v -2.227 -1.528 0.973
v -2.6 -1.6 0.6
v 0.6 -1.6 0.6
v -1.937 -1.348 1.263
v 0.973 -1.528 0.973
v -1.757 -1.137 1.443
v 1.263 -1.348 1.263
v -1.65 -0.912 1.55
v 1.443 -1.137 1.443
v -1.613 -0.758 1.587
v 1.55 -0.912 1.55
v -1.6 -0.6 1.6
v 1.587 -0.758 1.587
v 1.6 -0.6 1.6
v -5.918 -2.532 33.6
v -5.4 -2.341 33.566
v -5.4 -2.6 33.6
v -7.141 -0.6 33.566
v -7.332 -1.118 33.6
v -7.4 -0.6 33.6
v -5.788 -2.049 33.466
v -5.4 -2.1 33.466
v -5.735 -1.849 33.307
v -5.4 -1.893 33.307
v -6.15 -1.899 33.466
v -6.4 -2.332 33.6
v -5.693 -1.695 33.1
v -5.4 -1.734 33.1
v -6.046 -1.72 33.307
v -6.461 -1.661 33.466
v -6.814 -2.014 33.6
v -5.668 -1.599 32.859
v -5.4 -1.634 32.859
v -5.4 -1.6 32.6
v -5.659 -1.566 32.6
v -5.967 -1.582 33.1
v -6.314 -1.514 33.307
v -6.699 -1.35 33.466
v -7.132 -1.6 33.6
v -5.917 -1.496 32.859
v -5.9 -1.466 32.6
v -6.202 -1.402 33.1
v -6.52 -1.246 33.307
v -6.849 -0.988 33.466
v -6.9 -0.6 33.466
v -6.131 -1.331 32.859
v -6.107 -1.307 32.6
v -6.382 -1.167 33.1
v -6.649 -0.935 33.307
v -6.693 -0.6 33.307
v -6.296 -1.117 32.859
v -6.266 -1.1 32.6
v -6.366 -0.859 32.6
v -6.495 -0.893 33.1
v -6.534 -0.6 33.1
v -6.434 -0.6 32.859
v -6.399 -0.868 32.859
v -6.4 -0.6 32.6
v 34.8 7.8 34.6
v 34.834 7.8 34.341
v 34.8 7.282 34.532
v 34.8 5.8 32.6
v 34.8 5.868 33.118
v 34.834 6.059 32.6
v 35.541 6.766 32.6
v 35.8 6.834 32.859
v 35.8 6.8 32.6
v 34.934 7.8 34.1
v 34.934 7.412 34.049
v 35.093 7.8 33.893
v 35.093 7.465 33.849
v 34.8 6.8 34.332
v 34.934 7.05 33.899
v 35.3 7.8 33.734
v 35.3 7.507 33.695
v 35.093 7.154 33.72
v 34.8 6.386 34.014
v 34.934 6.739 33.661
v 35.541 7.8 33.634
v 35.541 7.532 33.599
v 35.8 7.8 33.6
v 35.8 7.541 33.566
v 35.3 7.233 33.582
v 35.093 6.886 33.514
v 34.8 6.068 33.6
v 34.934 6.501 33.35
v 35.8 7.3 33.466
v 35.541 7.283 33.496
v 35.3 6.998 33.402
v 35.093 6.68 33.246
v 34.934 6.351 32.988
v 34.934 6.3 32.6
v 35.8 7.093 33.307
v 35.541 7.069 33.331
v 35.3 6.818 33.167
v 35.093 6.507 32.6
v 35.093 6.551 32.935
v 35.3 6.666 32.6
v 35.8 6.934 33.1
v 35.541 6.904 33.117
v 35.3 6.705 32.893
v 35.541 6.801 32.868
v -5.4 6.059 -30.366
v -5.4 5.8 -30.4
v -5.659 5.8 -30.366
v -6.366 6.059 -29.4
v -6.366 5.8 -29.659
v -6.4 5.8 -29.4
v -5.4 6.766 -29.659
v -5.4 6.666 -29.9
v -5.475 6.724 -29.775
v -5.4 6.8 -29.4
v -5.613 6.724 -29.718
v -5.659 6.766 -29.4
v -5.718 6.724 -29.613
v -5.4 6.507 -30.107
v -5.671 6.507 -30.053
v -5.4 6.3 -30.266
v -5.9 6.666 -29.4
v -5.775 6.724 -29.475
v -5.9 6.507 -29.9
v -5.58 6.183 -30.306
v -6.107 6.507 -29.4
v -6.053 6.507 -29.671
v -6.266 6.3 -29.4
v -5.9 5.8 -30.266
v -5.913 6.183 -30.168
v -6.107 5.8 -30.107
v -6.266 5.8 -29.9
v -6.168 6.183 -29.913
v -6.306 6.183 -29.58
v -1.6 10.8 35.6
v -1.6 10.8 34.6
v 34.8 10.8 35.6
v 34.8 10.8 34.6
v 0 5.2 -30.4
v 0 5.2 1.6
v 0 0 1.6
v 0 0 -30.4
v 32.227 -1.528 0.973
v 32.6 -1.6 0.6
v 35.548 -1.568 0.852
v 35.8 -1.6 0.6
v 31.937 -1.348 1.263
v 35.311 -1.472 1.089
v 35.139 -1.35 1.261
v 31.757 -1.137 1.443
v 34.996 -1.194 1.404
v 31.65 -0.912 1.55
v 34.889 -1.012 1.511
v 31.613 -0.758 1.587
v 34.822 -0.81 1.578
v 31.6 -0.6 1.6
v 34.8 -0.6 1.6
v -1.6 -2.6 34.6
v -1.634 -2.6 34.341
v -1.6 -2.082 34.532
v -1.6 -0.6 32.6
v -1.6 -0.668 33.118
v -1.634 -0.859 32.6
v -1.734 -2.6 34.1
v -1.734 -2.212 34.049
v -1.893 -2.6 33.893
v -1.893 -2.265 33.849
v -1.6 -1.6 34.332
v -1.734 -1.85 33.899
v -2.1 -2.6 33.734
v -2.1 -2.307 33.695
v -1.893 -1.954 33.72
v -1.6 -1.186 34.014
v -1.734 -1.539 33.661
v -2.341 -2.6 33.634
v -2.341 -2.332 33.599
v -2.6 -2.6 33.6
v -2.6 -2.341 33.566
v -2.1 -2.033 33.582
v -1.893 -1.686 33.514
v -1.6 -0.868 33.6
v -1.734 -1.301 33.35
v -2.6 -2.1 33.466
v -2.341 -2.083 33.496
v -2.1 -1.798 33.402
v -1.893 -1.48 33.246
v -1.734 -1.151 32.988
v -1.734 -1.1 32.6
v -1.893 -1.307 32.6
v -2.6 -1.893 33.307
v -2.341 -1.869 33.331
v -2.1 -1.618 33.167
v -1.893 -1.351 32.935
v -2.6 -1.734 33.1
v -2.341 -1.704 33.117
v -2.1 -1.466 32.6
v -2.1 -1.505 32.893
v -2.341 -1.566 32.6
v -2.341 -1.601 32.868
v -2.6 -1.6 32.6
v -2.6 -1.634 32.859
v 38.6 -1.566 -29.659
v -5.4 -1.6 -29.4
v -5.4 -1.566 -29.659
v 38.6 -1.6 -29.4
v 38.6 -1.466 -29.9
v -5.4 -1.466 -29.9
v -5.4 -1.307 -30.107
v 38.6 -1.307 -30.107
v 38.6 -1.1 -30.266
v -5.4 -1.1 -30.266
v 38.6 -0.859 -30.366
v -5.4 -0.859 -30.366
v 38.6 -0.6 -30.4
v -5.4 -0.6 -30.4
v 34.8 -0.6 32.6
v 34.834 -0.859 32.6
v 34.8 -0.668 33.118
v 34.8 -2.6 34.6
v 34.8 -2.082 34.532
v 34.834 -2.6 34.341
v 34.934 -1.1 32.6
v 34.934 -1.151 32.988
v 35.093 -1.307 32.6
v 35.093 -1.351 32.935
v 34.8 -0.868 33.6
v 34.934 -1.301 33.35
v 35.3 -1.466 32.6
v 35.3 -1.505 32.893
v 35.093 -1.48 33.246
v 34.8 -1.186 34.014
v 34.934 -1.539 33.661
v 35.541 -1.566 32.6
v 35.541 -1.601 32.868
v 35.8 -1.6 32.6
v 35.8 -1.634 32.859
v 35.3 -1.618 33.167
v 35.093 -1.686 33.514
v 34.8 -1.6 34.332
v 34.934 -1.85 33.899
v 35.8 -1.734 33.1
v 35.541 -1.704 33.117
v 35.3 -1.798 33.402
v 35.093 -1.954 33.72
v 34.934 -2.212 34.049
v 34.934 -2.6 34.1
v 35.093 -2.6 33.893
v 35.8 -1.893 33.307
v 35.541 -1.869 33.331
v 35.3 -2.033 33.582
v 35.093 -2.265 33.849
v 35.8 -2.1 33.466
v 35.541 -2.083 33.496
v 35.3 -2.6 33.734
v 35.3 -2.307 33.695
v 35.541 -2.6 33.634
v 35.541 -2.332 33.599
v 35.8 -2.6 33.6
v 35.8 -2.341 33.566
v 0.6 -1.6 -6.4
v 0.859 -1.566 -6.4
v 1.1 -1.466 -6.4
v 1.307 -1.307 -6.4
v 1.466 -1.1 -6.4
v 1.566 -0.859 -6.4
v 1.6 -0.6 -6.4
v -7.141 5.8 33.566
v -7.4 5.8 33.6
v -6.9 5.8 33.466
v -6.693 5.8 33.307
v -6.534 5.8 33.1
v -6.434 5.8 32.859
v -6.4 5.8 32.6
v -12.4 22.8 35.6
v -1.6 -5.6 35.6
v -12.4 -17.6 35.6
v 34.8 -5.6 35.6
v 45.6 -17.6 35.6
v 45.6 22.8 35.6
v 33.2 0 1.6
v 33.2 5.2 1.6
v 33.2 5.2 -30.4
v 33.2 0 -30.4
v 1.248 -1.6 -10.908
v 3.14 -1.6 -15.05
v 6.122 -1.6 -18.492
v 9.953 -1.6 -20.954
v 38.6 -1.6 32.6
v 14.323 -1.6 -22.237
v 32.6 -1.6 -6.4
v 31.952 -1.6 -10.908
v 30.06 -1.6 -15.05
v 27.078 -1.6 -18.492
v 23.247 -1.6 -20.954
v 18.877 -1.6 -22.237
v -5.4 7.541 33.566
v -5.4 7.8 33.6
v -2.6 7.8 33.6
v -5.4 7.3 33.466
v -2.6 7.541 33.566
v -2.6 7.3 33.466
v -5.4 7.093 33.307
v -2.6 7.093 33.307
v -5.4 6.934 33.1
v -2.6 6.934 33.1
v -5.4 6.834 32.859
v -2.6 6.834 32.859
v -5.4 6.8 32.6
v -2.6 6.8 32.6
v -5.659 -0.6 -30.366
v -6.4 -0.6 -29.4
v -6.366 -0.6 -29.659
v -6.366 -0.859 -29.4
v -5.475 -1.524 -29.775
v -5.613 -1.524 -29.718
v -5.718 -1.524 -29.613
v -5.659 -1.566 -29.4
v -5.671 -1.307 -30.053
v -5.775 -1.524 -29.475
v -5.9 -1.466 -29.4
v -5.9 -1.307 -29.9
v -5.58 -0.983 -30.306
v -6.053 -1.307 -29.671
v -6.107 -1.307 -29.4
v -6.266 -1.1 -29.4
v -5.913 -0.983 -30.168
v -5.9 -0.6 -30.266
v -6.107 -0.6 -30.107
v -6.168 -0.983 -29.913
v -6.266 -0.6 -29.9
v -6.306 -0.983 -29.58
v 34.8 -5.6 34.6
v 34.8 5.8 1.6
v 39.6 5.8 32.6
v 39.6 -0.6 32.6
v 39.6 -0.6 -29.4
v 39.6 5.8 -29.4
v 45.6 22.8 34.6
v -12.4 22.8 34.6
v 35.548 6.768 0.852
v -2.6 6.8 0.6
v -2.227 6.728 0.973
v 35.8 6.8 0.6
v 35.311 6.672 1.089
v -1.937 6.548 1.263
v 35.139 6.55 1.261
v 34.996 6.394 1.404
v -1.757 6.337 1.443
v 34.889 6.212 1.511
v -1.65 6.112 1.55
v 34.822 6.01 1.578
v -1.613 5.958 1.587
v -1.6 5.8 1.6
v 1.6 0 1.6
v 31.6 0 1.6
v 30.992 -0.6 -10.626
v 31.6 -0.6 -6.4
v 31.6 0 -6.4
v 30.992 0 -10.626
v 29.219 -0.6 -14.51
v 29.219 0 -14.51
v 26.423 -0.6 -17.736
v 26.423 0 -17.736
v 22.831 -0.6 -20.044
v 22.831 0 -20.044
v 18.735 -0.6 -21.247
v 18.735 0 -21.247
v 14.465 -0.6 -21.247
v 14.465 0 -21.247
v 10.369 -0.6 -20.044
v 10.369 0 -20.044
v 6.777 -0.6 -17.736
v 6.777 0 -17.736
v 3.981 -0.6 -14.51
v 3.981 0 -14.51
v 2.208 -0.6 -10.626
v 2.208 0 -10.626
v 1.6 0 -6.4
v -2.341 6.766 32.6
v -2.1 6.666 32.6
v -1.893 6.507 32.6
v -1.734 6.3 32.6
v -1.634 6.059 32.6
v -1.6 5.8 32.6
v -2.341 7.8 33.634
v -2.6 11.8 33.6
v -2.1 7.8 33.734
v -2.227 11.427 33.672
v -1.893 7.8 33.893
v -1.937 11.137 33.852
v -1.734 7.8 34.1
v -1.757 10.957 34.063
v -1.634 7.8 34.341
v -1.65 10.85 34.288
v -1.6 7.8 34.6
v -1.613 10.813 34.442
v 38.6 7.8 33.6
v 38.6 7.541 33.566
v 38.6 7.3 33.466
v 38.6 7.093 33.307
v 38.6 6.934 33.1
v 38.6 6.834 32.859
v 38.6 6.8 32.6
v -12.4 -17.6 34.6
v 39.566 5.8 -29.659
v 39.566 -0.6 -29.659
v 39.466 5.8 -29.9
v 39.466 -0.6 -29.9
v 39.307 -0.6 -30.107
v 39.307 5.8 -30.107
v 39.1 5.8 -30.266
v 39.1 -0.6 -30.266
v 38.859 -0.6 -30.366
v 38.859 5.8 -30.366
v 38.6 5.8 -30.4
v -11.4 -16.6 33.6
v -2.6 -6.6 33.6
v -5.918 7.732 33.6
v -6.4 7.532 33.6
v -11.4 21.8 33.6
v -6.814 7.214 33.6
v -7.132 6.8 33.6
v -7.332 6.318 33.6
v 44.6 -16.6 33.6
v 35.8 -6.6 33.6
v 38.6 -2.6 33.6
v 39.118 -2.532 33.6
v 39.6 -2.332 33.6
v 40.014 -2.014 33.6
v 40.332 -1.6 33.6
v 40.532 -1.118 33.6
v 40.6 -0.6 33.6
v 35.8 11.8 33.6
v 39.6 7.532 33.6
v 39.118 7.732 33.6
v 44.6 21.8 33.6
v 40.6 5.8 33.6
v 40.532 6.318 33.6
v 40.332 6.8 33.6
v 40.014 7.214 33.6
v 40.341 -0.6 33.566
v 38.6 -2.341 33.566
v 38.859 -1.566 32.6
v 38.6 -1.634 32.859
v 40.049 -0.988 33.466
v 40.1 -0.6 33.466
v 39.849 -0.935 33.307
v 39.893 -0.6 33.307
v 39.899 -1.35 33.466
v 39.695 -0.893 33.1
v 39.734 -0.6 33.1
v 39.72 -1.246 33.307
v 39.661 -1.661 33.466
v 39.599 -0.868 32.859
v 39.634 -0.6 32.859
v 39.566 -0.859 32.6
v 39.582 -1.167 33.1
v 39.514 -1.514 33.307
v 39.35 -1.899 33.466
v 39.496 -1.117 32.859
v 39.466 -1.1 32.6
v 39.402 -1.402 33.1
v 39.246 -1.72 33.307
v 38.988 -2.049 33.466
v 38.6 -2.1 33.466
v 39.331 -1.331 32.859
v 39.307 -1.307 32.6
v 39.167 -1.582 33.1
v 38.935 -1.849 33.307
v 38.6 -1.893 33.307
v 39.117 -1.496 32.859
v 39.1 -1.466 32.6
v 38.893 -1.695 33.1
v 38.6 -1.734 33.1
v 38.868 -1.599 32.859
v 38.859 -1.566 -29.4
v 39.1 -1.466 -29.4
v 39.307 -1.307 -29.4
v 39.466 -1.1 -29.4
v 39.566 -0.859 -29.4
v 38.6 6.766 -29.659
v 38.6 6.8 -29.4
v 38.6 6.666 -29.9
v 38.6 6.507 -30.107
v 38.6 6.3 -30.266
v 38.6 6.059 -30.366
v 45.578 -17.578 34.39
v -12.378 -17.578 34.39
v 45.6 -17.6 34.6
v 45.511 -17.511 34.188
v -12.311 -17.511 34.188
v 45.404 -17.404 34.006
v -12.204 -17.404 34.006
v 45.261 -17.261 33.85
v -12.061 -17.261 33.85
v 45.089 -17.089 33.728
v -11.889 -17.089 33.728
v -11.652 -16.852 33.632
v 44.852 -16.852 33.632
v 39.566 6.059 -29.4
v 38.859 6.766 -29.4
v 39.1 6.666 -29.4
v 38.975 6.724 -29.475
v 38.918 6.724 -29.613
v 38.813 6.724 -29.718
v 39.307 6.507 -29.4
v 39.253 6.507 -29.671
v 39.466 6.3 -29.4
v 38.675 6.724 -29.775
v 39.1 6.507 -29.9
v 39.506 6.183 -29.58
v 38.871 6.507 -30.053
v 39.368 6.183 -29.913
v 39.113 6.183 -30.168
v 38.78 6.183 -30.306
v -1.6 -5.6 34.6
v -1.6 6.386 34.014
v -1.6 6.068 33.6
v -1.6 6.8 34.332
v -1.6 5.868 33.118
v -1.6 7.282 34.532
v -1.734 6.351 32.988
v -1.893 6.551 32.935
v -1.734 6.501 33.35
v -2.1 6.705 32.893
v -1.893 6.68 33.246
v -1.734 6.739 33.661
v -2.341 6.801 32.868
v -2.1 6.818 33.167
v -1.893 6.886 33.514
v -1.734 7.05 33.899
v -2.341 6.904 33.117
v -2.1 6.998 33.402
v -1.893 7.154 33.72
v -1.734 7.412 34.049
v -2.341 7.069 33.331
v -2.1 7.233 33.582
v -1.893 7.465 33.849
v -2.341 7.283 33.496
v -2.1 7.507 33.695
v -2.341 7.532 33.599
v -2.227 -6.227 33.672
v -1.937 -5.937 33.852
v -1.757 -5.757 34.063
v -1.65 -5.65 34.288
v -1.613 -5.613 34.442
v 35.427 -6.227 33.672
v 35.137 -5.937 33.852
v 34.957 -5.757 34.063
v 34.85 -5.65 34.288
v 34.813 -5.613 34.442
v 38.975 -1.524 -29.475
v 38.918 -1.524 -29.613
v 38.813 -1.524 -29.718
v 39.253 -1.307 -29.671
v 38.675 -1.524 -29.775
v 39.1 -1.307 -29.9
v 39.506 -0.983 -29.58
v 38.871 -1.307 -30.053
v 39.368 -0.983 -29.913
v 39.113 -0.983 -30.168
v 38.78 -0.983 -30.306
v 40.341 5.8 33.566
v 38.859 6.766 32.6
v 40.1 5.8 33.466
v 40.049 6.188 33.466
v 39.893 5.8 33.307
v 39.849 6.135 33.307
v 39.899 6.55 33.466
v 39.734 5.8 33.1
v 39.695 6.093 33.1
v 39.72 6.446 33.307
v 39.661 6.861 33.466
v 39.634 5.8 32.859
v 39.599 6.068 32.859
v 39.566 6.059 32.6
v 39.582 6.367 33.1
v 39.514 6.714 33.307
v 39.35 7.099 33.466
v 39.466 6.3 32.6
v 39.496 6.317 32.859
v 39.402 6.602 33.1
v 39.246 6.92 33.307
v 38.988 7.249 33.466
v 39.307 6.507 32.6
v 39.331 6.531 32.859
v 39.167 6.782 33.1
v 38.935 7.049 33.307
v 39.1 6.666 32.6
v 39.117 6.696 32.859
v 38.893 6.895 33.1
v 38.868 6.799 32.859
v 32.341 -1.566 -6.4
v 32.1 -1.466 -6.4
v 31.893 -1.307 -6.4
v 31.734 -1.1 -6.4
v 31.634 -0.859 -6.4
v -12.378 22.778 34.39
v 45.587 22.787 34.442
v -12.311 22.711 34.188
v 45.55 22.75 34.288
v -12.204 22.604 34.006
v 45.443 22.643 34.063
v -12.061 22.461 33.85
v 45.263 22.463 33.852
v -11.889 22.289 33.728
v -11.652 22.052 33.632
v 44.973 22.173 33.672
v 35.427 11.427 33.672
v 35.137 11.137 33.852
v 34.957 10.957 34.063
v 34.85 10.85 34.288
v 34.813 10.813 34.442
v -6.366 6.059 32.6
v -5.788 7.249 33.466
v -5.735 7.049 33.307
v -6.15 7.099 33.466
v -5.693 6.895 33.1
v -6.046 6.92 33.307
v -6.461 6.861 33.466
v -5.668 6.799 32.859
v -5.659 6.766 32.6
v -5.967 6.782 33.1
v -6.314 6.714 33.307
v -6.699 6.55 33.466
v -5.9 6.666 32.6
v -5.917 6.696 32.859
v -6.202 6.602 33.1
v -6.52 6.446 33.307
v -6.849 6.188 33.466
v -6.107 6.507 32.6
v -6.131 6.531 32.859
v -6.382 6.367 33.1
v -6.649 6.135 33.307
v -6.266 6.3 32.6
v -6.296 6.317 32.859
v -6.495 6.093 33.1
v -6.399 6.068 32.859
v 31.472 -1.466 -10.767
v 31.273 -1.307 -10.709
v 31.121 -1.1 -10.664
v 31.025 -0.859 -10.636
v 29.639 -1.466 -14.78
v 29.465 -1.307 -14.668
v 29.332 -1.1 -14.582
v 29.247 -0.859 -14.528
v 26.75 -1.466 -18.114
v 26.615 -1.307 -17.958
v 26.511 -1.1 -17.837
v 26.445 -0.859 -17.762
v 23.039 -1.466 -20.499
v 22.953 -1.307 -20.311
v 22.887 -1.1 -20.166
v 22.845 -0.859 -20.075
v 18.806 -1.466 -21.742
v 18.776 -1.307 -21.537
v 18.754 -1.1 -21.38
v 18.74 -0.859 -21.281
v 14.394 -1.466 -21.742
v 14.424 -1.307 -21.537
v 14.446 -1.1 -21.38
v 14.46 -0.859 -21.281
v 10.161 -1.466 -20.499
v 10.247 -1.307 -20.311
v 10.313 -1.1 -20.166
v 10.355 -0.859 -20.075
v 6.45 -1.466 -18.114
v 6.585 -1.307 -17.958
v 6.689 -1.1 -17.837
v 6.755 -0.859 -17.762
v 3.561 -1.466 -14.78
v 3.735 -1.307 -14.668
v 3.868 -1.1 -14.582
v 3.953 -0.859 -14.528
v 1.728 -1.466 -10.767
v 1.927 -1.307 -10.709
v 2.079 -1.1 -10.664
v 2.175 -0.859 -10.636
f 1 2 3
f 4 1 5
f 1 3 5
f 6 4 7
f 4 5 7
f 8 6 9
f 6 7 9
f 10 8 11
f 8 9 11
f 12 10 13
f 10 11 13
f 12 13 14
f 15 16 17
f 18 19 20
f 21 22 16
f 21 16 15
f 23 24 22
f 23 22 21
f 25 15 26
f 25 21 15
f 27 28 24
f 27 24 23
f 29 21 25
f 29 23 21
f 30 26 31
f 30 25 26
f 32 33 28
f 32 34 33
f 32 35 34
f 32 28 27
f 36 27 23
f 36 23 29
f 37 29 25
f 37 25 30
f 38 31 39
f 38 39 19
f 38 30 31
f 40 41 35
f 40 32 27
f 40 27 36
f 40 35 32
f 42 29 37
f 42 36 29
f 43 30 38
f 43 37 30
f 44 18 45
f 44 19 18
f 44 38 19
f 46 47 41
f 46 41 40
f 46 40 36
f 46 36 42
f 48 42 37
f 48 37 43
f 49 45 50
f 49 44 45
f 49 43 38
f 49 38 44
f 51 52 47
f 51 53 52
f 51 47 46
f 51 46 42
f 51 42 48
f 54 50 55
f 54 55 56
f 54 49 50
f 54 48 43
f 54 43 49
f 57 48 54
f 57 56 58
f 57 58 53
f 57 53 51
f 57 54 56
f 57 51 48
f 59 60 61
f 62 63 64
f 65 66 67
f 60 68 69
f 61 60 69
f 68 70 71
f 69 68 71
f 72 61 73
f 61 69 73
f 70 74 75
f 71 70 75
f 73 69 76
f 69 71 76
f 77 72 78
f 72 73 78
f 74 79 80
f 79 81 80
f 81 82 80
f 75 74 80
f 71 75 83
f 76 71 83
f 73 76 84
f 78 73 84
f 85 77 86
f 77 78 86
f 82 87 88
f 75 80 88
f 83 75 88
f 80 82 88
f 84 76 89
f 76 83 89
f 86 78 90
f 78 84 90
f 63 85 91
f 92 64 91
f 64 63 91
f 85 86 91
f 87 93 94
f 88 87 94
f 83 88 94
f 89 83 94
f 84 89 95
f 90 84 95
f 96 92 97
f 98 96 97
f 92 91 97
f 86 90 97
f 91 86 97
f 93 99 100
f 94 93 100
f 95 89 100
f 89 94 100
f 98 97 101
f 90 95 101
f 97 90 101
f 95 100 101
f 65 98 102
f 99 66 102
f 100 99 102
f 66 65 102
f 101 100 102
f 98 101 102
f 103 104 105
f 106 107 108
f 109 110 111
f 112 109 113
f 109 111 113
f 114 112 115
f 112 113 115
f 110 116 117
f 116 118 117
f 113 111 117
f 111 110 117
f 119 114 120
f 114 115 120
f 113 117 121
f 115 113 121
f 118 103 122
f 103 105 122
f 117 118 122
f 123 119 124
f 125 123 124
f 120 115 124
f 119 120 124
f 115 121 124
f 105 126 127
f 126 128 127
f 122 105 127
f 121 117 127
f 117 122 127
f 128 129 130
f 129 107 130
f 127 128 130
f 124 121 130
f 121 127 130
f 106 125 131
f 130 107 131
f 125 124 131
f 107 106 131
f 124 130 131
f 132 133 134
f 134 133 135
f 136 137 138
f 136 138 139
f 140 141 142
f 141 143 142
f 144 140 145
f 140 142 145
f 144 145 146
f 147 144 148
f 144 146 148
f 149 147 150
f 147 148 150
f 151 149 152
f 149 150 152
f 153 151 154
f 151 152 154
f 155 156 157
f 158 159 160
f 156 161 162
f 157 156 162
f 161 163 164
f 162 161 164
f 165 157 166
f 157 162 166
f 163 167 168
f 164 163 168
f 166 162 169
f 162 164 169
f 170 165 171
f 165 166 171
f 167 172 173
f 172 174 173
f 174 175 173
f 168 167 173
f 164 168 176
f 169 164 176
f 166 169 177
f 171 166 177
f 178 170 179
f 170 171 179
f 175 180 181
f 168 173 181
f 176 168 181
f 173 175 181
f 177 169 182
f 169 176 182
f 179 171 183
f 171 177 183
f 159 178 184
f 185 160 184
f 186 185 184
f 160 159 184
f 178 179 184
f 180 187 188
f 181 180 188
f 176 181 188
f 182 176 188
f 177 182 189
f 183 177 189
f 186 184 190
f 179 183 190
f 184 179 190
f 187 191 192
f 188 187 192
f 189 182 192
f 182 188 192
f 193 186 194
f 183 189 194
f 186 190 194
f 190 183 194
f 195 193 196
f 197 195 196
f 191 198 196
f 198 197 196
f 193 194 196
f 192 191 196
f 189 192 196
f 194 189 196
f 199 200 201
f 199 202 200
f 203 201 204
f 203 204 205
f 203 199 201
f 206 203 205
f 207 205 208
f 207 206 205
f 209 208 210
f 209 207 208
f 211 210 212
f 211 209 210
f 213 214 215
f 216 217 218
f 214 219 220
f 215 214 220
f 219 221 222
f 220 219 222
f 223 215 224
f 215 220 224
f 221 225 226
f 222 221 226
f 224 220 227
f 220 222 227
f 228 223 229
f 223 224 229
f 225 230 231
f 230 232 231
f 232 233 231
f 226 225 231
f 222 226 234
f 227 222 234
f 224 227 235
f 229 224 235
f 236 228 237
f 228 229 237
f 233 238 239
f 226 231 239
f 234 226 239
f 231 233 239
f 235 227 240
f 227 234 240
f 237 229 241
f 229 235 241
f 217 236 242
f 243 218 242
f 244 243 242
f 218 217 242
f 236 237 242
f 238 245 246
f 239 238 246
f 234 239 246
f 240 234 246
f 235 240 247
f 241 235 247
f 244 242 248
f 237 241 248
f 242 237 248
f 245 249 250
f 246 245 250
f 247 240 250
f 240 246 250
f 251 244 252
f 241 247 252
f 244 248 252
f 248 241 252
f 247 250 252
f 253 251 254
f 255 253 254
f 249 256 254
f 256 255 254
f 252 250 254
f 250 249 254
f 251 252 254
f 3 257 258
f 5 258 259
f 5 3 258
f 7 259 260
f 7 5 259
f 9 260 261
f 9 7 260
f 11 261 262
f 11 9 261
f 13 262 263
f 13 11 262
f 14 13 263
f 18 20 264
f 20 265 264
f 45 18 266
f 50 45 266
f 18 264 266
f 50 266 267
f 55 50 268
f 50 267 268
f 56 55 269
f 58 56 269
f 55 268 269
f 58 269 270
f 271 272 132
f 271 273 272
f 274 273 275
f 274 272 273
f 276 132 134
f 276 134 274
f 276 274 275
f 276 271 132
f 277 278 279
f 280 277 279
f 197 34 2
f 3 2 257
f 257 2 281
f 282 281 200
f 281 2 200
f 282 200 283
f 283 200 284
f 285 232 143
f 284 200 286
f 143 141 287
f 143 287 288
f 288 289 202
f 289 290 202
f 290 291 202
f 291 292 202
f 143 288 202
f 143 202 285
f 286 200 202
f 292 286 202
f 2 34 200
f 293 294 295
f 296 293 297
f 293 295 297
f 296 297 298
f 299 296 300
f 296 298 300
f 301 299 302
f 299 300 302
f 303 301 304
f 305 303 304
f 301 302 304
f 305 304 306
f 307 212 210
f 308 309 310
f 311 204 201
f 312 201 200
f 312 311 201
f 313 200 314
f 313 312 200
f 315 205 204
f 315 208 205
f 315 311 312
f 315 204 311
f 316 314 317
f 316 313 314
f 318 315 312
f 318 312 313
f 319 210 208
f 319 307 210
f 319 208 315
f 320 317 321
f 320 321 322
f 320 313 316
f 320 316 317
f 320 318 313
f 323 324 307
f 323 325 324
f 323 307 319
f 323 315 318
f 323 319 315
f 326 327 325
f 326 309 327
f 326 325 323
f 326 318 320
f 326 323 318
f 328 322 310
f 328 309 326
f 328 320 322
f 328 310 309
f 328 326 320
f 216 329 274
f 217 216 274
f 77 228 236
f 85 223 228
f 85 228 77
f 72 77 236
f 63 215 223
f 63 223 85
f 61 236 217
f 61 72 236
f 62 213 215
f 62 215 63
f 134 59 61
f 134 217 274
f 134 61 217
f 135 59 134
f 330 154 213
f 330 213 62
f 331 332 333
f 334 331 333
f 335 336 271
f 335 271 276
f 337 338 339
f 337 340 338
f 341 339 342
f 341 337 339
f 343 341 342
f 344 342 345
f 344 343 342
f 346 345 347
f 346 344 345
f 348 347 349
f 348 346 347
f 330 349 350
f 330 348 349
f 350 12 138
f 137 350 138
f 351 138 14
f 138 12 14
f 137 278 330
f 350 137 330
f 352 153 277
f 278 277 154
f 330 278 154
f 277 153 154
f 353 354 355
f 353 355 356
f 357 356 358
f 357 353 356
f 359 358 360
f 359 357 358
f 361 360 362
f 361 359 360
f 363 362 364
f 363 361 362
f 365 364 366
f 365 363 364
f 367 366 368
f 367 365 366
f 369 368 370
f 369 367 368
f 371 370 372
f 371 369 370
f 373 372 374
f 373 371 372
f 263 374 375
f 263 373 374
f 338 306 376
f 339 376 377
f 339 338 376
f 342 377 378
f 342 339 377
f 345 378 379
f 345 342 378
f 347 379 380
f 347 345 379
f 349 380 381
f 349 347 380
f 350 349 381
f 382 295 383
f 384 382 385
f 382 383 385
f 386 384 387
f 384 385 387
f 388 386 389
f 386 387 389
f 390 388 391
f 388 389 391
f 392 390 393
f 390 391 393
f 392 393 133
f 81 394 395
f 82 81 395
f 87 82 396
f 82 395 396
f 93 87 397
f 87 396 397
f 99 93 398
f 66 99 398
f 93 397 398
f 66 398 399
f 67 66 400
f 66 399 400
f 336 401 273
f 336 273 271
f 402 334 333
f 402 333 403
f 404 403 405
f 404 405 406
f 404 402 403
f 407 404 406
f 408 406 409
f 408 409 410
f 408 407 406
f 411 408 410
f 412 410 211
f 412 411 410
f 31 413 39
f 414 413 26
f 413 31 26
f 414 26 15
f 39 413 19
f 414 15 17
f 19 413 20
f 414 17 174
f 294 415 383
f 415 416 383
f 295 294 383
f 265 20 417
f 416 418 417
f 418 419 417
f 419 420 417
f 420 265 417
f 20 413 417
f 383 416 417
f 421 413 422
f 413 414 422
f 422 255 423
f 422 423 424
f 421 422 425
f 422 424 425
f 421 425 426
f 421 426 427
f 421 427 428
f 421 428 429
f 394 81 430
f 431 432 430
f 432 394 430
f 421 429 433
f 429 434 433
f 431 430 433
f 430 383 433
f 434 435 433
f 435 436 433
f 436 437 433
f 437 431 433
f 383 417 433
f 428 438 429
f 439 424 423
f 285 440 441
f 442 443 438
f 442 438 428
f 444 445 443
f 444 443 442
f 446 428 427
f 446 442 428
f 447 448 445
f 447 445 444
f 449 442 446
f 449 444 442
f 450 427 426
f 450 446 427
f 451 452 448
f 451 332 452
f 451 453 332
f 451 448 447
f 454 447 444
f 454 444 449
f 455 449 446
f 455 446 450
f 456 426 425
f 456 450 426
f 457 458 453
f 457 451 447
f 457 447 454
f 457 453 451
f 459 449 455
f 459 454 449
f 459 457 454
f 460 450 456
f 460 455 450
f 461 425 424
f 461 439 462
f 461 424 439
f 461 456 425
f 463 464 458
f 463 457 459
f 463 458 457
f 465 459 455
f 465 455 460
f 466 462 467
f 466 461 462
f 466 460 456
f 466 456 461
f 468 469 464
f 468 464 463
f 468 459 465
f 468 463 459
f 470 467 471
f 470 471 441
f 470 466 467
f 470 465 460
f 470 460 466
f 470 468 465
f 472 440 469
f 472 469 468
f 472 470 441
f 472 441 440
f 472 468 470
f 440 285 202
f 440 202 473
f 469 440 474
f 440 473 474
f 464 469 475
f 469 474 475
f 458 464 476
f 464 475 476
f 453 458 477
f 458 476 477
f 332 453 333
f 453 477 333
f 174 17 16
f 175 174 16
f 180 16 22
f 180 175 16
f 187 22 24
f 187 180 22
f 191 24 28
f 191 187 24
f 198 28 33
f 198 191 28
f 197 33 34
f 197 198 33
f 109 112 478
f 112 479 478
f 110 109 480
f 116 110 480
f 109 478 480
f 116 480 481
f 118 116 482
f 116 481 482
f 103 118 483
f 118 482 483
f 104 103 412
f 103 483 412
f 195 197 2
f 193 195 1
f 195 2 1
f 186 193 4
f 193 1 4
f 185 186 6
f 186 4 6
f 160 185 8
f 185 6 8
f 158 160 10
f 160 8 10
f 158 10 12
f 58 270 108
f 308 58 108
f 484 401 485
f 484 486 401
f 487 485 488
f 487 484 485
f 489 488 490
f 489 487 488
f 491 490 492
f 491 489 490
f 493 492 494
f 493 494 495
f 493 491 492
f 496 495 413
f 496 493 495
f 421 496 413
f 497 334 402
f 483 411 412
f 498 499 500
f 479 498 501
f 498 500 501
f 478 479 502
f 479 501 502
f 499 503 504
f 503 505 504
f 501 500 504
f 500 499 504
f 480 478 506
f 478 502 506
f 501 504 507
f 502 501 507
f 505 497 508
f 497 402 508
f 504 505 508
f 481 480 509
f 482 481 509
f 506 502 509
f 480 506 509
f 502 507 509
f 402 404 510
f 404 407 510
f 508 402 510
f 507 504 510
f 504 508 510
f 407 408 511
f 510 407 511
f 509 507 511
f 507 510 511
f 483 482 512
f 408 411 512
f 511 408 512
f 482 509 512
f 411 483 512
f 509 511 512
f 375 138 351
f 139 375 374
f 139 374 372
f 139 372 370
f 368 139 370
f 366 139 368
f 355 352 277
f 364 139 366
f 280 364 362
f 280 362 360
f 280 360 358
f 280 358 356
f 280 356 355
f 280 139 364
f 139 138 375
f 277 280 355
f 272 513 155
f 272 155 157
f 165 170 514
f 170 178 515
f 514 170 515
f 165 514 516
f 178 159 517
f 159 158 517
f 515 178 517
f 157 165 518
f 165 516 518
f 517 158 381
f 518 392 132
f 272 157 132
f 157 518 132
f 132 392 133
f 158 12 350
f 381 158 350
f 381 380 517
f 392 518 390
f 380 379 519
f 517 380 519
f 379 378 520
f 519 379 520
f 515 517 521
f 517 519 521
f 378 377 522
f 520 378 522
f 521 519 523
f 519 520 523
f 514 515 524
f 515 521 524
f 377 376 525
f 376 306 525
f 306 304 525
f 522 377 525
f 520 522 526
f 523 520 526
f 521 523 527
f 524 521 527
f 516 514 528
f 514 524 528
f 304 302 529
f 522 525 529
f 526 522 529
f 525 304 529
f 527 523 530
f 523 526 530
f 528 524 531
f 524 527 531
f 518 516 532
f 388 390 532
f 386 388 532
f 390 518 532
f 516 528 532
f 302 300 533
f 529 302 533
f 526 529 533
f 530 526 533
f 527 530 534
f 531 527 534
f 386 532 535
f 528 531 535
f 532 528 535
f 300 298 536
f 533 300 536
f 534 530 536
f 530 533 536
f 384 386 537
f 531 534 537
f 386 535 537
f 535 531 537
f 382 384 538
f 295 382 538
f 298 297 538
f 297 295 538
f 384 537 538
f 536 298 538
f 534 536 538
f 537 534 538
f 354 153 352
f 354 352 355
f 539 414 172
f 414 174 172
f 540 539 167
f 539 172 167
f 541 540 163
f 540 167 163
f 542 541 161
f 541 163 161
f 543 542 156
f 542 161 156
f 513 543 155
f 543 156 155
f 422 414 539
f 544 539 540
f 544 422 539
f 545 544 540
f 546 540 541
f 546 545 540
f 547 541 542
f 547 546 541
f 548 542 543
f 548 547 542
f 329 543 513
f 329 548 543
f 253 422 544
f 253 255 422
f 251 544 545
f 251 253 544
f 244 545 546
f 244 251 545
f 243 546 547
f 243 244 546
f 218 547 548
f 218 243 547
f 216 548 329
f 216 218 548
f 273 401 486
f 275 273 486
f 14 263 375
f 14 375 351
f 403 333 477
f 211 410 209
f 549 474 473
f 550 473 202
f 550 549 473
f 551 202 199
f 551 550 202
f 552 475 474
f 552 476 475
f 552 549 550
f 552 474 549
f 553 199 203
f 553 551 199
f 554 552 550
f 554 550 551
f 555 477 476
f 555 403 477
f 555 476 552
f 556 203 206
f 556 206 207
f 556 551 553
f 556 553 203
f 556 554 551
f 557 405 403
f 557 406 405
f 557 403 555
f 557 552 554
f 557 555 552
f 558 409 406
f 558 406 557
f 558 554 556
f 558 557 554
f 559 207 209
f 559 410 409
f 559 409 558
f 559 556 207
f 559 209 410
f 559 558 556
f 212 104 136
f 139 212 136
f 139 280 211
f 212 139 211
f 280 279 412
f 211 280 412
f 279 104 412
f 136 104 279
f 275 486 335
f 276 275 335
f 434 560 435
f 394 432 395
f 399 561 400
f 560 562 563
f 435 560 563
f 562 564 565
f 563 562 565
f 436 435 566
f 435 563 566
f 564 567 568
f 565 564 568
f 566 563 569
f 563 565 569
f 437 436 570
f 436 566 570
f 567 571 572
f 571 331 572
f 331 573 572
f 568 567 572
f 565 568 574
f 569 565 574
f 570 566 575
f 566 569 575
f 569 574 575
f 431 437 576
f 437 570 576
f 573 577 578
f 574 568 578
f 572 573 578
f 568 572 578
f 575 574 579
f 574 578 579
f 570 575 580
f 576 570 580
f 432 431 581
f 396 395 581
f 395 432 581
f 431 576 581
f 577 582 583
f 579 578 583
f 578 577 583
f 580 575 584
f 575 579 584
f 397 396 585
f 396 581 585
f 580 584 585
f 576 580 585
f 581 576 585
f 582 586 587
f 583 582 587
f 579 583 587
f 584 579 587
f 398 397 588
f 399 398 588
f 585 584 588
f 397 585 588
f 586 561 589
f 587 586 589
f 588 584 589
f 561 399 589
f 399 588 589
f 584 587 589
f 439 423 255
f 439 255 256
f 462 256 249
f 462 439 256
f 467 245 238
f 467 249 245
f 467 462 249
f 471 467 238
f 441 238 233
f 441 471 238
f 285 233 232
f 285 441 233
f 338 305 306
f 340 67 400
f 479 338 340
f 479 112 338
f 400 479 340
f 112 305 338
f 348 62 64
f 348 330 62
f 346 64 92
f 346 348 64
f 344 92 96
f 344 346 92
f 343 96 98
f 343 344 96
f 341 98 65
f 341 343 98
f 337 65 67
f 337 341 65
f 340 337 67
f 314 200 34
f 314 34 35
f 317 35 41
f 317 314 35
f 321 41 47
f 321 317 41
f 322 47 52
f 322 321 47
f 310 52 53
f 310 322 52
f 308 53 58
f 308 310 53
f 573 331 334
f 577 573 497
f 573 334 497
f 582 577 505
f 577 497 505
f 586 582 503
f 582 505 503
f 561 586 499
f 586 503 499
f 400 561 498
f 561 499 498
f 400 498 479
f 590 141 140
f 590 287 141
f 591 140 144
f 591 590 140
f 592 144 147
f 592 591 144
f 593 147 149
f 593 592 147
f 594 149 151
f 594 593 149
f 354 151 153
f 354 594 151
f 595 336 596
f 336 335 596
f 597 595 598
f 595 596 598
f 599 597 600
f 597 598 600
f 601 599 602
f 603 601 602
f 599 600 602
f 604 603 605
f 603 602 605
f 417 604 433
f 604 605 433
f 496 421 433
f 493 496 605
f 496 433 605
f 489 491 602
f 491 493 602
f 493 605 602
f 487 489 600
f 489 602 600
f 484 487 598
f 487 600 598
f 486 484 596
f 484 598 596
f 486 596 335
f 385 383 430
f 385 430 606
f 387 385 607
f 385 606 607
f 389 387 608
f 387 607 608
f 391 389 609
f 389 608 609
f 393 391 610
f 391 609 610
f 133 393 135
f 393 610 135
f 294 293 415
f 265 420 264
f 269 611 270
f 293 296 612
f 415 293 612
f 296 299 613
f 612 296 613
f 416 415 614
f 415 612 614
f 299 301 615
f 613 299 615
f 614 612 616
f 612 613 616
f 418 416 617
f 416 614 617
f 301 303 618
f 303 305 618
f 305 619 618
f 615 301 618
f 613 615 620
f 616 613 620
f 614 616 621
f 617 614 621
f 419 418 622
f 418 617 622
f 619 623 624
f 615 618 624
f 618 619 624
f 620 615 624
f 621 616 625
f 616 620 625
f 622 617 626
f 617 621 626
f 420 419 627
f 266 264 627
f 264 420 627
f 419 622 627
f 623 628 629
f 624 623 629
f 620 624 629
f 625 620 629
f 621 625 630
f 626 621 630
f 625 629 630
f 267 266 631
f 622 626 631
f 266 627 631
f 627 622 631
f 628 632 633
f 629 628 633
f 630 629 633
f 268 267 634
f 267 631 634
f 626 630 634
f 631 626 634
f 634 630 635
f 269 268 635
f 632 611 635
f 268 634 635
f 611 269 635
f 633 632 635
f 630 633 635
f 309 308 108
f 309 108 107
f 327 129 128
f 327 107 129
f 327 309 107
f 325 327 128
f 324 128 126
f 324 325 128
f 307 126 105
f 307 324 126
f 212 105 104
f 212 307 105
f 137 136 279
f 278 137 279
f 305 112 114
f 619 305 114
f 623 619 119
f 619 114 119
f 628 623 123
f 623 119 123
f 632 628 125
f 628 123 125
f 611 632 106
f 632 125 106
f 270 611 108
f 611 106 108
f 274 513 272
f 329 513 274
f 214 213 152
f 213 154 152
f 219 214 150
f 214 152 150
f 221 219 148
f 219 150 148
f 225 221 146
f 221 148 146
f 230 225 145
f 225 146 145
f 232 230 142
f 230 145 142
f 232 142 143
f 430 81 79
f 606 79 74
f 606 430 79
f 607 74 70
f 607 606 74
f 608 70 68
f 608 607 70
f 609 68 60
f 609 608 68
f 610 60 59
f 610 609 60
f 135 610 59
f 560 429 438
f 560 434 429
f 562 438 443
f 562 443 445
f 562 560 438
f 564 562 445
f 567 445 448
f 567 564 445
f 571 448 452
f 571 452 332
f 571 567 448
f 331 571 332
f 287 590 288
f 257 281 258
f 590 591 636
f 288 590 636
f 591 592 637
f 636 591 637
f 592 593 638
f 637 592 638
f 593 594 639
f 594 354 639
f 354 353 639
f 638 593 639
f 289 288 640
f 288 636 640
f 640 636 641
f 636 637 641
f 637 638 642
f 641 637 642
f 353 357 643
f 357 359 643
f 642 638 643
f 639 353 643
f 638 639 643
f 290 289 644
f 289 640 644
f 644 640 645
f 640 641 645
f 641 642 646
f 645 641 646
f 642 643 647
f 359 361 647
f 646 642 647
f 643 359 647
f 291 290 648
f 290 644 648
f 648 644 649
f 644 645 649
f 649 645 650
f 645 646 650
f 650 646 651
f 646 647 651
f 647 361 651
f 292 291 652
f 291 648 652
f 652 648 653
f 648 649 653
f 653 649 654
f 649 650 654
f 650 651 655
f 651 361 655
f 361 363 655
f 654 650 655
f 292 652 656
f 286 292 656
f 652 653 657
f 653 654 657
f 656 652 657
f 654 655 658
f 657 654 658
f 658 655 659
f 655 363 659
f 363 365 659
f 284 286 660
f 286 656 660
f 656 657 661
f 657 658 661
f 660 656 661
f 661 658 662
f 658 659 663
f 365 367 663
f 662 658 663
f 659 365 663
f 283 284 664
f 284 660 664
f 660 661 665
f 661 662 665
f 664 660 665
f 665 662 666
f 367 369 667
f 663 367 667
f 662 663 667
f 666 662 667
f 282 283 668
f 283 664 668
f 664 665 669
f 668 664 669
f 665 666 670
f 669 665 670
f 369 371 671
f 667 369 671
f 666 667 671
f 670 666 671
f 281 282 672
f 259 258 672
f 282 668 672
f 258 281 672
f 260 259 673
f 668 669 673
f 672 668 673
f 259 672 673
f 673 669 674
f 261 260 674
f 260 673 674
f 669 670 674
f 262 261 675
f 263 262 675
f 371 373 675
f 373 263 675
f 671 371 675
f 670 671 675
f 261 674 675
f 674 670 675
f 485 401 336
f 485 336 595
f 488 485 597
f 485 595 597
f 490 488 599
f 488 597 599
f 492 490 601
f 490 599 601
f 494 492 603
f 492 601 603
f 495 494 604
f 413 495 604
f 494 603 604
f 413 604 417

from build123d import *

# Parameters (mm, degrees)
SKETCH1_W                = 36.4
SKETCH1_H                = 75.6
SKETCH1_W_2              = 33.2
SKETCH1_H_2              = 72.4
BOSS_EXTRUDE1_DEPTH      = 5.2
SKETCH2_W                = 36.4
SKETCH2_H                = 75.6
BOSS_EXTRUDE2_DEPTH      = 1.6
BOSS_EXTRUDE3_START      = 5.2
SKETCH2_2_W              = 36.4
SKETCH2_2_H              = 75.6
BOSS_EXTRUDE3_DEPTH      = 1.6
CUT_EXTRUDE1_START       = -1.6
SKETCH3_W                = 33.2
SKETCH3_H                = 1.6
CUT_EXTRUDE1_DEPTH       = 5.2
CUT_EXTRUDE2_DEPTH       = 2
BOSS_EXTRUDE5_DEPTH      = 6.8
BOSS_EXTRUDE5_DEPTH_BACK = 1.6
SKETCH6_W                = 4.8
SKETCH6_H                = 64
SKETCH7_W                = 36.4
SKETCH7_H                = 43.6
CUT_EXTRUDE3_DEPTH       = 12
SKETCH8_W                = 58
SKETCH8_H                = 40.4
SKETCH8_W_2              = 36.4
SKETCH8_H_2              = 16.4
BOSS_EXTRUDE6_DEPTH      = 2
FILLET2_R                = 1


with BuildPart() as part:
    # Sketch1 → Boss-Extrude1 (new body)
    with BuildSketch(Plane(origin=(0, 0, 0), x_dir=(1, 0, 0), z_dir=(0, 1, 0))):
        with Locations((16.6, 36.2)):
            Rectangle(SKETCH1_W, SKETCH1_H)
        with Locations((16.6, 36.2)):
            Rectangle(SKETCH1_W_2, SKETCH1_H_2, mode=Mode.SUBTRACT)
    extrude(amount=BOSS_EXTRUDE1_DEPTH)

    # Sketch2 → Boss-Extrude2 (add)
    with BuildSketch(Plane(origin=(0, 0, 0), x_dir=(1, 0, 0), z_dir=(0, 1, 0))):
        with Locations((16.6, 36.2)):
            Rectangle(SKETCH2_W, SKETCH2_H)
    extrude(amount=-BOSS_EXTRUDE2_DEPTH)

    # Sketch2<2> → Boss-Extrude3 (add)
    with BuildSketch(Plane(origin=(0, 0, 0), x_dir=(1, 0, 0), z_dir=(0, 1, 0)).offset(BOSS_EXTRUDE3_START)):
        with Locations((16.6, 36.2)):
            Rectangle(SKETCH2_2_W, SKETCH2_2_H)
    extrude(amount=BOSS_EXTRUDE3_DEPTH)

    # Sketch3 → Cut-Extrude1 (cut)
    with BuildSketch(Plane(origin=(0, 6.8, 0), x_dir=(1, 0, 0), z_dir=(0, 1, 0)).offset(CUT_EXTRUDE1_START)):
        with Locations((16.6, -0.8)):
            Rectangle(SKETCH3_W, SKETCH3_H)
    extrude(amount=-CUT_EXTRUDE1_DEPTH, mode=Mode.SUBTRACT)

    # Sketch5 → Cut-Extrude2 (cut)
    with BuildSketch(Plane.XZ.offset(1.6)):
        with BuildLine():
            Line((1.6, 1.6), (31.6, 1.6))
            Line((31.6, 1.6), (31.6, -6.4))
            ThreePointArc((31.6, -6.4), (16.6, -21.4), (1.6, -6.4))
            Line((1.6, -6.4), (1.6, 1.6))
        make_face()
    extrude(amount=-CUT_EXTRUDE2_DEPTH, mode=Mode.SUBTRACT)

    # Sketch6 → Boss-Extrude5 (add, two sides: drawn at the far end of the back side and taken through both)
    with BuildSketch(Plane(origin=(0, 0, 0), x_dir=(1, 0, 0), z_dir=(0, 1, 0)).offset(-BOSS_EXTRUDE5_DEPTH_BACK)):
        with Locations((-4, -1.6)):
            Rectangle(SKETCH6_W, SKETCH6_H)
        with Locations((37.2, -1.6)):
            Rectangle(SKETCH6_W, SKETCH6_H)
    extrude(amount=BOSS_EXTRUDE5_DEPTH + BOSS_EXTRUDE5_DEPTH_BACK)

    # Sketch7 → Cut-Extrude3 (cut)
    with BuildSketch(Plane.XZ.offset(1.6)):
        with Locations((16.6, -52.2)):
            Rectangle(SKETCH7_W, SKETCH7_H)
    extrude(amount=-CUT_EXTRUDE3_DEPTH, mode=Mode.SUBTRACT)

    # Sketch8 → Boss-Extrude6 (add)
    with BuildSketch(Plane.XY.offset(33.6)):
        with Locations((16.6, 2.6)):
            Rectangle(SKETCH8_W, SKETCH8_H)
        with Locations((16.6, 2.6)):
            Rectangle(SKETCH8_W_2, SKETCH8_H_2, mode=Mode.SUBTRACT)
    extrude(amount=BOSS_EXTRUDE6_DEPTH)

    # Fillet2
    fillet2_edges = [part.edges().sort_by_distance(p)[0] for p in [
        (16.6, -17.6, 33.6),
        (45.6, 2.6, 33.6),
        (16.6, 22.8, 33.6),
        (-12.4, 2.6, 33.6),
        (-1.6, 8.8, 33.6),
        (16.6, 10.8, 33.6),
        (34.8, 8.8, 33.6),
        (34.8, -3.6, 33.6),
        (16.6, -5.6, 33.6),
        (-1.6, -3.6, 33.6),
        (37.2, 6.8, 33.6),
        (34.8, 6.8, 17.6),
        (16.6, 6.8, 1.6),
        (-1.6, 6.8, 17.6),
        (-4, 6.8, 33.6),
        (16.6, 6.8, -30.4),
        (39.6, 2.6, 33.6),
        (39.6, 6.8, 1.6),
        (39.6, 2.6, -30.4),
        (-4, -1.6, 33.6),
        (-1.6, -1.6, 17.6),
        (0, -1.6, 1.6),
        (1.6, -1.6, -2.4),
        (16.6, -1.6, -21.4),
        (31.6, -1.6, -2.4),
        (33.2, -1.6, 1.6),
        (34.8, -1.6, 17.6),
        (37.2, -1.6, 33.6),
        (39.6, -1.6, 1.6),
        (16.6, -1.6, -30.4),
        (-6.4, -1.6, 1.6),
        (-6.4, 2.6, -30.4),
        (-6.4, 6.8, 1.6),
        (-6.4, 2.6, 33.6),
    ]]
    fillet(fillet2_edges, radius=FILLET2_R)


solid = part.part
